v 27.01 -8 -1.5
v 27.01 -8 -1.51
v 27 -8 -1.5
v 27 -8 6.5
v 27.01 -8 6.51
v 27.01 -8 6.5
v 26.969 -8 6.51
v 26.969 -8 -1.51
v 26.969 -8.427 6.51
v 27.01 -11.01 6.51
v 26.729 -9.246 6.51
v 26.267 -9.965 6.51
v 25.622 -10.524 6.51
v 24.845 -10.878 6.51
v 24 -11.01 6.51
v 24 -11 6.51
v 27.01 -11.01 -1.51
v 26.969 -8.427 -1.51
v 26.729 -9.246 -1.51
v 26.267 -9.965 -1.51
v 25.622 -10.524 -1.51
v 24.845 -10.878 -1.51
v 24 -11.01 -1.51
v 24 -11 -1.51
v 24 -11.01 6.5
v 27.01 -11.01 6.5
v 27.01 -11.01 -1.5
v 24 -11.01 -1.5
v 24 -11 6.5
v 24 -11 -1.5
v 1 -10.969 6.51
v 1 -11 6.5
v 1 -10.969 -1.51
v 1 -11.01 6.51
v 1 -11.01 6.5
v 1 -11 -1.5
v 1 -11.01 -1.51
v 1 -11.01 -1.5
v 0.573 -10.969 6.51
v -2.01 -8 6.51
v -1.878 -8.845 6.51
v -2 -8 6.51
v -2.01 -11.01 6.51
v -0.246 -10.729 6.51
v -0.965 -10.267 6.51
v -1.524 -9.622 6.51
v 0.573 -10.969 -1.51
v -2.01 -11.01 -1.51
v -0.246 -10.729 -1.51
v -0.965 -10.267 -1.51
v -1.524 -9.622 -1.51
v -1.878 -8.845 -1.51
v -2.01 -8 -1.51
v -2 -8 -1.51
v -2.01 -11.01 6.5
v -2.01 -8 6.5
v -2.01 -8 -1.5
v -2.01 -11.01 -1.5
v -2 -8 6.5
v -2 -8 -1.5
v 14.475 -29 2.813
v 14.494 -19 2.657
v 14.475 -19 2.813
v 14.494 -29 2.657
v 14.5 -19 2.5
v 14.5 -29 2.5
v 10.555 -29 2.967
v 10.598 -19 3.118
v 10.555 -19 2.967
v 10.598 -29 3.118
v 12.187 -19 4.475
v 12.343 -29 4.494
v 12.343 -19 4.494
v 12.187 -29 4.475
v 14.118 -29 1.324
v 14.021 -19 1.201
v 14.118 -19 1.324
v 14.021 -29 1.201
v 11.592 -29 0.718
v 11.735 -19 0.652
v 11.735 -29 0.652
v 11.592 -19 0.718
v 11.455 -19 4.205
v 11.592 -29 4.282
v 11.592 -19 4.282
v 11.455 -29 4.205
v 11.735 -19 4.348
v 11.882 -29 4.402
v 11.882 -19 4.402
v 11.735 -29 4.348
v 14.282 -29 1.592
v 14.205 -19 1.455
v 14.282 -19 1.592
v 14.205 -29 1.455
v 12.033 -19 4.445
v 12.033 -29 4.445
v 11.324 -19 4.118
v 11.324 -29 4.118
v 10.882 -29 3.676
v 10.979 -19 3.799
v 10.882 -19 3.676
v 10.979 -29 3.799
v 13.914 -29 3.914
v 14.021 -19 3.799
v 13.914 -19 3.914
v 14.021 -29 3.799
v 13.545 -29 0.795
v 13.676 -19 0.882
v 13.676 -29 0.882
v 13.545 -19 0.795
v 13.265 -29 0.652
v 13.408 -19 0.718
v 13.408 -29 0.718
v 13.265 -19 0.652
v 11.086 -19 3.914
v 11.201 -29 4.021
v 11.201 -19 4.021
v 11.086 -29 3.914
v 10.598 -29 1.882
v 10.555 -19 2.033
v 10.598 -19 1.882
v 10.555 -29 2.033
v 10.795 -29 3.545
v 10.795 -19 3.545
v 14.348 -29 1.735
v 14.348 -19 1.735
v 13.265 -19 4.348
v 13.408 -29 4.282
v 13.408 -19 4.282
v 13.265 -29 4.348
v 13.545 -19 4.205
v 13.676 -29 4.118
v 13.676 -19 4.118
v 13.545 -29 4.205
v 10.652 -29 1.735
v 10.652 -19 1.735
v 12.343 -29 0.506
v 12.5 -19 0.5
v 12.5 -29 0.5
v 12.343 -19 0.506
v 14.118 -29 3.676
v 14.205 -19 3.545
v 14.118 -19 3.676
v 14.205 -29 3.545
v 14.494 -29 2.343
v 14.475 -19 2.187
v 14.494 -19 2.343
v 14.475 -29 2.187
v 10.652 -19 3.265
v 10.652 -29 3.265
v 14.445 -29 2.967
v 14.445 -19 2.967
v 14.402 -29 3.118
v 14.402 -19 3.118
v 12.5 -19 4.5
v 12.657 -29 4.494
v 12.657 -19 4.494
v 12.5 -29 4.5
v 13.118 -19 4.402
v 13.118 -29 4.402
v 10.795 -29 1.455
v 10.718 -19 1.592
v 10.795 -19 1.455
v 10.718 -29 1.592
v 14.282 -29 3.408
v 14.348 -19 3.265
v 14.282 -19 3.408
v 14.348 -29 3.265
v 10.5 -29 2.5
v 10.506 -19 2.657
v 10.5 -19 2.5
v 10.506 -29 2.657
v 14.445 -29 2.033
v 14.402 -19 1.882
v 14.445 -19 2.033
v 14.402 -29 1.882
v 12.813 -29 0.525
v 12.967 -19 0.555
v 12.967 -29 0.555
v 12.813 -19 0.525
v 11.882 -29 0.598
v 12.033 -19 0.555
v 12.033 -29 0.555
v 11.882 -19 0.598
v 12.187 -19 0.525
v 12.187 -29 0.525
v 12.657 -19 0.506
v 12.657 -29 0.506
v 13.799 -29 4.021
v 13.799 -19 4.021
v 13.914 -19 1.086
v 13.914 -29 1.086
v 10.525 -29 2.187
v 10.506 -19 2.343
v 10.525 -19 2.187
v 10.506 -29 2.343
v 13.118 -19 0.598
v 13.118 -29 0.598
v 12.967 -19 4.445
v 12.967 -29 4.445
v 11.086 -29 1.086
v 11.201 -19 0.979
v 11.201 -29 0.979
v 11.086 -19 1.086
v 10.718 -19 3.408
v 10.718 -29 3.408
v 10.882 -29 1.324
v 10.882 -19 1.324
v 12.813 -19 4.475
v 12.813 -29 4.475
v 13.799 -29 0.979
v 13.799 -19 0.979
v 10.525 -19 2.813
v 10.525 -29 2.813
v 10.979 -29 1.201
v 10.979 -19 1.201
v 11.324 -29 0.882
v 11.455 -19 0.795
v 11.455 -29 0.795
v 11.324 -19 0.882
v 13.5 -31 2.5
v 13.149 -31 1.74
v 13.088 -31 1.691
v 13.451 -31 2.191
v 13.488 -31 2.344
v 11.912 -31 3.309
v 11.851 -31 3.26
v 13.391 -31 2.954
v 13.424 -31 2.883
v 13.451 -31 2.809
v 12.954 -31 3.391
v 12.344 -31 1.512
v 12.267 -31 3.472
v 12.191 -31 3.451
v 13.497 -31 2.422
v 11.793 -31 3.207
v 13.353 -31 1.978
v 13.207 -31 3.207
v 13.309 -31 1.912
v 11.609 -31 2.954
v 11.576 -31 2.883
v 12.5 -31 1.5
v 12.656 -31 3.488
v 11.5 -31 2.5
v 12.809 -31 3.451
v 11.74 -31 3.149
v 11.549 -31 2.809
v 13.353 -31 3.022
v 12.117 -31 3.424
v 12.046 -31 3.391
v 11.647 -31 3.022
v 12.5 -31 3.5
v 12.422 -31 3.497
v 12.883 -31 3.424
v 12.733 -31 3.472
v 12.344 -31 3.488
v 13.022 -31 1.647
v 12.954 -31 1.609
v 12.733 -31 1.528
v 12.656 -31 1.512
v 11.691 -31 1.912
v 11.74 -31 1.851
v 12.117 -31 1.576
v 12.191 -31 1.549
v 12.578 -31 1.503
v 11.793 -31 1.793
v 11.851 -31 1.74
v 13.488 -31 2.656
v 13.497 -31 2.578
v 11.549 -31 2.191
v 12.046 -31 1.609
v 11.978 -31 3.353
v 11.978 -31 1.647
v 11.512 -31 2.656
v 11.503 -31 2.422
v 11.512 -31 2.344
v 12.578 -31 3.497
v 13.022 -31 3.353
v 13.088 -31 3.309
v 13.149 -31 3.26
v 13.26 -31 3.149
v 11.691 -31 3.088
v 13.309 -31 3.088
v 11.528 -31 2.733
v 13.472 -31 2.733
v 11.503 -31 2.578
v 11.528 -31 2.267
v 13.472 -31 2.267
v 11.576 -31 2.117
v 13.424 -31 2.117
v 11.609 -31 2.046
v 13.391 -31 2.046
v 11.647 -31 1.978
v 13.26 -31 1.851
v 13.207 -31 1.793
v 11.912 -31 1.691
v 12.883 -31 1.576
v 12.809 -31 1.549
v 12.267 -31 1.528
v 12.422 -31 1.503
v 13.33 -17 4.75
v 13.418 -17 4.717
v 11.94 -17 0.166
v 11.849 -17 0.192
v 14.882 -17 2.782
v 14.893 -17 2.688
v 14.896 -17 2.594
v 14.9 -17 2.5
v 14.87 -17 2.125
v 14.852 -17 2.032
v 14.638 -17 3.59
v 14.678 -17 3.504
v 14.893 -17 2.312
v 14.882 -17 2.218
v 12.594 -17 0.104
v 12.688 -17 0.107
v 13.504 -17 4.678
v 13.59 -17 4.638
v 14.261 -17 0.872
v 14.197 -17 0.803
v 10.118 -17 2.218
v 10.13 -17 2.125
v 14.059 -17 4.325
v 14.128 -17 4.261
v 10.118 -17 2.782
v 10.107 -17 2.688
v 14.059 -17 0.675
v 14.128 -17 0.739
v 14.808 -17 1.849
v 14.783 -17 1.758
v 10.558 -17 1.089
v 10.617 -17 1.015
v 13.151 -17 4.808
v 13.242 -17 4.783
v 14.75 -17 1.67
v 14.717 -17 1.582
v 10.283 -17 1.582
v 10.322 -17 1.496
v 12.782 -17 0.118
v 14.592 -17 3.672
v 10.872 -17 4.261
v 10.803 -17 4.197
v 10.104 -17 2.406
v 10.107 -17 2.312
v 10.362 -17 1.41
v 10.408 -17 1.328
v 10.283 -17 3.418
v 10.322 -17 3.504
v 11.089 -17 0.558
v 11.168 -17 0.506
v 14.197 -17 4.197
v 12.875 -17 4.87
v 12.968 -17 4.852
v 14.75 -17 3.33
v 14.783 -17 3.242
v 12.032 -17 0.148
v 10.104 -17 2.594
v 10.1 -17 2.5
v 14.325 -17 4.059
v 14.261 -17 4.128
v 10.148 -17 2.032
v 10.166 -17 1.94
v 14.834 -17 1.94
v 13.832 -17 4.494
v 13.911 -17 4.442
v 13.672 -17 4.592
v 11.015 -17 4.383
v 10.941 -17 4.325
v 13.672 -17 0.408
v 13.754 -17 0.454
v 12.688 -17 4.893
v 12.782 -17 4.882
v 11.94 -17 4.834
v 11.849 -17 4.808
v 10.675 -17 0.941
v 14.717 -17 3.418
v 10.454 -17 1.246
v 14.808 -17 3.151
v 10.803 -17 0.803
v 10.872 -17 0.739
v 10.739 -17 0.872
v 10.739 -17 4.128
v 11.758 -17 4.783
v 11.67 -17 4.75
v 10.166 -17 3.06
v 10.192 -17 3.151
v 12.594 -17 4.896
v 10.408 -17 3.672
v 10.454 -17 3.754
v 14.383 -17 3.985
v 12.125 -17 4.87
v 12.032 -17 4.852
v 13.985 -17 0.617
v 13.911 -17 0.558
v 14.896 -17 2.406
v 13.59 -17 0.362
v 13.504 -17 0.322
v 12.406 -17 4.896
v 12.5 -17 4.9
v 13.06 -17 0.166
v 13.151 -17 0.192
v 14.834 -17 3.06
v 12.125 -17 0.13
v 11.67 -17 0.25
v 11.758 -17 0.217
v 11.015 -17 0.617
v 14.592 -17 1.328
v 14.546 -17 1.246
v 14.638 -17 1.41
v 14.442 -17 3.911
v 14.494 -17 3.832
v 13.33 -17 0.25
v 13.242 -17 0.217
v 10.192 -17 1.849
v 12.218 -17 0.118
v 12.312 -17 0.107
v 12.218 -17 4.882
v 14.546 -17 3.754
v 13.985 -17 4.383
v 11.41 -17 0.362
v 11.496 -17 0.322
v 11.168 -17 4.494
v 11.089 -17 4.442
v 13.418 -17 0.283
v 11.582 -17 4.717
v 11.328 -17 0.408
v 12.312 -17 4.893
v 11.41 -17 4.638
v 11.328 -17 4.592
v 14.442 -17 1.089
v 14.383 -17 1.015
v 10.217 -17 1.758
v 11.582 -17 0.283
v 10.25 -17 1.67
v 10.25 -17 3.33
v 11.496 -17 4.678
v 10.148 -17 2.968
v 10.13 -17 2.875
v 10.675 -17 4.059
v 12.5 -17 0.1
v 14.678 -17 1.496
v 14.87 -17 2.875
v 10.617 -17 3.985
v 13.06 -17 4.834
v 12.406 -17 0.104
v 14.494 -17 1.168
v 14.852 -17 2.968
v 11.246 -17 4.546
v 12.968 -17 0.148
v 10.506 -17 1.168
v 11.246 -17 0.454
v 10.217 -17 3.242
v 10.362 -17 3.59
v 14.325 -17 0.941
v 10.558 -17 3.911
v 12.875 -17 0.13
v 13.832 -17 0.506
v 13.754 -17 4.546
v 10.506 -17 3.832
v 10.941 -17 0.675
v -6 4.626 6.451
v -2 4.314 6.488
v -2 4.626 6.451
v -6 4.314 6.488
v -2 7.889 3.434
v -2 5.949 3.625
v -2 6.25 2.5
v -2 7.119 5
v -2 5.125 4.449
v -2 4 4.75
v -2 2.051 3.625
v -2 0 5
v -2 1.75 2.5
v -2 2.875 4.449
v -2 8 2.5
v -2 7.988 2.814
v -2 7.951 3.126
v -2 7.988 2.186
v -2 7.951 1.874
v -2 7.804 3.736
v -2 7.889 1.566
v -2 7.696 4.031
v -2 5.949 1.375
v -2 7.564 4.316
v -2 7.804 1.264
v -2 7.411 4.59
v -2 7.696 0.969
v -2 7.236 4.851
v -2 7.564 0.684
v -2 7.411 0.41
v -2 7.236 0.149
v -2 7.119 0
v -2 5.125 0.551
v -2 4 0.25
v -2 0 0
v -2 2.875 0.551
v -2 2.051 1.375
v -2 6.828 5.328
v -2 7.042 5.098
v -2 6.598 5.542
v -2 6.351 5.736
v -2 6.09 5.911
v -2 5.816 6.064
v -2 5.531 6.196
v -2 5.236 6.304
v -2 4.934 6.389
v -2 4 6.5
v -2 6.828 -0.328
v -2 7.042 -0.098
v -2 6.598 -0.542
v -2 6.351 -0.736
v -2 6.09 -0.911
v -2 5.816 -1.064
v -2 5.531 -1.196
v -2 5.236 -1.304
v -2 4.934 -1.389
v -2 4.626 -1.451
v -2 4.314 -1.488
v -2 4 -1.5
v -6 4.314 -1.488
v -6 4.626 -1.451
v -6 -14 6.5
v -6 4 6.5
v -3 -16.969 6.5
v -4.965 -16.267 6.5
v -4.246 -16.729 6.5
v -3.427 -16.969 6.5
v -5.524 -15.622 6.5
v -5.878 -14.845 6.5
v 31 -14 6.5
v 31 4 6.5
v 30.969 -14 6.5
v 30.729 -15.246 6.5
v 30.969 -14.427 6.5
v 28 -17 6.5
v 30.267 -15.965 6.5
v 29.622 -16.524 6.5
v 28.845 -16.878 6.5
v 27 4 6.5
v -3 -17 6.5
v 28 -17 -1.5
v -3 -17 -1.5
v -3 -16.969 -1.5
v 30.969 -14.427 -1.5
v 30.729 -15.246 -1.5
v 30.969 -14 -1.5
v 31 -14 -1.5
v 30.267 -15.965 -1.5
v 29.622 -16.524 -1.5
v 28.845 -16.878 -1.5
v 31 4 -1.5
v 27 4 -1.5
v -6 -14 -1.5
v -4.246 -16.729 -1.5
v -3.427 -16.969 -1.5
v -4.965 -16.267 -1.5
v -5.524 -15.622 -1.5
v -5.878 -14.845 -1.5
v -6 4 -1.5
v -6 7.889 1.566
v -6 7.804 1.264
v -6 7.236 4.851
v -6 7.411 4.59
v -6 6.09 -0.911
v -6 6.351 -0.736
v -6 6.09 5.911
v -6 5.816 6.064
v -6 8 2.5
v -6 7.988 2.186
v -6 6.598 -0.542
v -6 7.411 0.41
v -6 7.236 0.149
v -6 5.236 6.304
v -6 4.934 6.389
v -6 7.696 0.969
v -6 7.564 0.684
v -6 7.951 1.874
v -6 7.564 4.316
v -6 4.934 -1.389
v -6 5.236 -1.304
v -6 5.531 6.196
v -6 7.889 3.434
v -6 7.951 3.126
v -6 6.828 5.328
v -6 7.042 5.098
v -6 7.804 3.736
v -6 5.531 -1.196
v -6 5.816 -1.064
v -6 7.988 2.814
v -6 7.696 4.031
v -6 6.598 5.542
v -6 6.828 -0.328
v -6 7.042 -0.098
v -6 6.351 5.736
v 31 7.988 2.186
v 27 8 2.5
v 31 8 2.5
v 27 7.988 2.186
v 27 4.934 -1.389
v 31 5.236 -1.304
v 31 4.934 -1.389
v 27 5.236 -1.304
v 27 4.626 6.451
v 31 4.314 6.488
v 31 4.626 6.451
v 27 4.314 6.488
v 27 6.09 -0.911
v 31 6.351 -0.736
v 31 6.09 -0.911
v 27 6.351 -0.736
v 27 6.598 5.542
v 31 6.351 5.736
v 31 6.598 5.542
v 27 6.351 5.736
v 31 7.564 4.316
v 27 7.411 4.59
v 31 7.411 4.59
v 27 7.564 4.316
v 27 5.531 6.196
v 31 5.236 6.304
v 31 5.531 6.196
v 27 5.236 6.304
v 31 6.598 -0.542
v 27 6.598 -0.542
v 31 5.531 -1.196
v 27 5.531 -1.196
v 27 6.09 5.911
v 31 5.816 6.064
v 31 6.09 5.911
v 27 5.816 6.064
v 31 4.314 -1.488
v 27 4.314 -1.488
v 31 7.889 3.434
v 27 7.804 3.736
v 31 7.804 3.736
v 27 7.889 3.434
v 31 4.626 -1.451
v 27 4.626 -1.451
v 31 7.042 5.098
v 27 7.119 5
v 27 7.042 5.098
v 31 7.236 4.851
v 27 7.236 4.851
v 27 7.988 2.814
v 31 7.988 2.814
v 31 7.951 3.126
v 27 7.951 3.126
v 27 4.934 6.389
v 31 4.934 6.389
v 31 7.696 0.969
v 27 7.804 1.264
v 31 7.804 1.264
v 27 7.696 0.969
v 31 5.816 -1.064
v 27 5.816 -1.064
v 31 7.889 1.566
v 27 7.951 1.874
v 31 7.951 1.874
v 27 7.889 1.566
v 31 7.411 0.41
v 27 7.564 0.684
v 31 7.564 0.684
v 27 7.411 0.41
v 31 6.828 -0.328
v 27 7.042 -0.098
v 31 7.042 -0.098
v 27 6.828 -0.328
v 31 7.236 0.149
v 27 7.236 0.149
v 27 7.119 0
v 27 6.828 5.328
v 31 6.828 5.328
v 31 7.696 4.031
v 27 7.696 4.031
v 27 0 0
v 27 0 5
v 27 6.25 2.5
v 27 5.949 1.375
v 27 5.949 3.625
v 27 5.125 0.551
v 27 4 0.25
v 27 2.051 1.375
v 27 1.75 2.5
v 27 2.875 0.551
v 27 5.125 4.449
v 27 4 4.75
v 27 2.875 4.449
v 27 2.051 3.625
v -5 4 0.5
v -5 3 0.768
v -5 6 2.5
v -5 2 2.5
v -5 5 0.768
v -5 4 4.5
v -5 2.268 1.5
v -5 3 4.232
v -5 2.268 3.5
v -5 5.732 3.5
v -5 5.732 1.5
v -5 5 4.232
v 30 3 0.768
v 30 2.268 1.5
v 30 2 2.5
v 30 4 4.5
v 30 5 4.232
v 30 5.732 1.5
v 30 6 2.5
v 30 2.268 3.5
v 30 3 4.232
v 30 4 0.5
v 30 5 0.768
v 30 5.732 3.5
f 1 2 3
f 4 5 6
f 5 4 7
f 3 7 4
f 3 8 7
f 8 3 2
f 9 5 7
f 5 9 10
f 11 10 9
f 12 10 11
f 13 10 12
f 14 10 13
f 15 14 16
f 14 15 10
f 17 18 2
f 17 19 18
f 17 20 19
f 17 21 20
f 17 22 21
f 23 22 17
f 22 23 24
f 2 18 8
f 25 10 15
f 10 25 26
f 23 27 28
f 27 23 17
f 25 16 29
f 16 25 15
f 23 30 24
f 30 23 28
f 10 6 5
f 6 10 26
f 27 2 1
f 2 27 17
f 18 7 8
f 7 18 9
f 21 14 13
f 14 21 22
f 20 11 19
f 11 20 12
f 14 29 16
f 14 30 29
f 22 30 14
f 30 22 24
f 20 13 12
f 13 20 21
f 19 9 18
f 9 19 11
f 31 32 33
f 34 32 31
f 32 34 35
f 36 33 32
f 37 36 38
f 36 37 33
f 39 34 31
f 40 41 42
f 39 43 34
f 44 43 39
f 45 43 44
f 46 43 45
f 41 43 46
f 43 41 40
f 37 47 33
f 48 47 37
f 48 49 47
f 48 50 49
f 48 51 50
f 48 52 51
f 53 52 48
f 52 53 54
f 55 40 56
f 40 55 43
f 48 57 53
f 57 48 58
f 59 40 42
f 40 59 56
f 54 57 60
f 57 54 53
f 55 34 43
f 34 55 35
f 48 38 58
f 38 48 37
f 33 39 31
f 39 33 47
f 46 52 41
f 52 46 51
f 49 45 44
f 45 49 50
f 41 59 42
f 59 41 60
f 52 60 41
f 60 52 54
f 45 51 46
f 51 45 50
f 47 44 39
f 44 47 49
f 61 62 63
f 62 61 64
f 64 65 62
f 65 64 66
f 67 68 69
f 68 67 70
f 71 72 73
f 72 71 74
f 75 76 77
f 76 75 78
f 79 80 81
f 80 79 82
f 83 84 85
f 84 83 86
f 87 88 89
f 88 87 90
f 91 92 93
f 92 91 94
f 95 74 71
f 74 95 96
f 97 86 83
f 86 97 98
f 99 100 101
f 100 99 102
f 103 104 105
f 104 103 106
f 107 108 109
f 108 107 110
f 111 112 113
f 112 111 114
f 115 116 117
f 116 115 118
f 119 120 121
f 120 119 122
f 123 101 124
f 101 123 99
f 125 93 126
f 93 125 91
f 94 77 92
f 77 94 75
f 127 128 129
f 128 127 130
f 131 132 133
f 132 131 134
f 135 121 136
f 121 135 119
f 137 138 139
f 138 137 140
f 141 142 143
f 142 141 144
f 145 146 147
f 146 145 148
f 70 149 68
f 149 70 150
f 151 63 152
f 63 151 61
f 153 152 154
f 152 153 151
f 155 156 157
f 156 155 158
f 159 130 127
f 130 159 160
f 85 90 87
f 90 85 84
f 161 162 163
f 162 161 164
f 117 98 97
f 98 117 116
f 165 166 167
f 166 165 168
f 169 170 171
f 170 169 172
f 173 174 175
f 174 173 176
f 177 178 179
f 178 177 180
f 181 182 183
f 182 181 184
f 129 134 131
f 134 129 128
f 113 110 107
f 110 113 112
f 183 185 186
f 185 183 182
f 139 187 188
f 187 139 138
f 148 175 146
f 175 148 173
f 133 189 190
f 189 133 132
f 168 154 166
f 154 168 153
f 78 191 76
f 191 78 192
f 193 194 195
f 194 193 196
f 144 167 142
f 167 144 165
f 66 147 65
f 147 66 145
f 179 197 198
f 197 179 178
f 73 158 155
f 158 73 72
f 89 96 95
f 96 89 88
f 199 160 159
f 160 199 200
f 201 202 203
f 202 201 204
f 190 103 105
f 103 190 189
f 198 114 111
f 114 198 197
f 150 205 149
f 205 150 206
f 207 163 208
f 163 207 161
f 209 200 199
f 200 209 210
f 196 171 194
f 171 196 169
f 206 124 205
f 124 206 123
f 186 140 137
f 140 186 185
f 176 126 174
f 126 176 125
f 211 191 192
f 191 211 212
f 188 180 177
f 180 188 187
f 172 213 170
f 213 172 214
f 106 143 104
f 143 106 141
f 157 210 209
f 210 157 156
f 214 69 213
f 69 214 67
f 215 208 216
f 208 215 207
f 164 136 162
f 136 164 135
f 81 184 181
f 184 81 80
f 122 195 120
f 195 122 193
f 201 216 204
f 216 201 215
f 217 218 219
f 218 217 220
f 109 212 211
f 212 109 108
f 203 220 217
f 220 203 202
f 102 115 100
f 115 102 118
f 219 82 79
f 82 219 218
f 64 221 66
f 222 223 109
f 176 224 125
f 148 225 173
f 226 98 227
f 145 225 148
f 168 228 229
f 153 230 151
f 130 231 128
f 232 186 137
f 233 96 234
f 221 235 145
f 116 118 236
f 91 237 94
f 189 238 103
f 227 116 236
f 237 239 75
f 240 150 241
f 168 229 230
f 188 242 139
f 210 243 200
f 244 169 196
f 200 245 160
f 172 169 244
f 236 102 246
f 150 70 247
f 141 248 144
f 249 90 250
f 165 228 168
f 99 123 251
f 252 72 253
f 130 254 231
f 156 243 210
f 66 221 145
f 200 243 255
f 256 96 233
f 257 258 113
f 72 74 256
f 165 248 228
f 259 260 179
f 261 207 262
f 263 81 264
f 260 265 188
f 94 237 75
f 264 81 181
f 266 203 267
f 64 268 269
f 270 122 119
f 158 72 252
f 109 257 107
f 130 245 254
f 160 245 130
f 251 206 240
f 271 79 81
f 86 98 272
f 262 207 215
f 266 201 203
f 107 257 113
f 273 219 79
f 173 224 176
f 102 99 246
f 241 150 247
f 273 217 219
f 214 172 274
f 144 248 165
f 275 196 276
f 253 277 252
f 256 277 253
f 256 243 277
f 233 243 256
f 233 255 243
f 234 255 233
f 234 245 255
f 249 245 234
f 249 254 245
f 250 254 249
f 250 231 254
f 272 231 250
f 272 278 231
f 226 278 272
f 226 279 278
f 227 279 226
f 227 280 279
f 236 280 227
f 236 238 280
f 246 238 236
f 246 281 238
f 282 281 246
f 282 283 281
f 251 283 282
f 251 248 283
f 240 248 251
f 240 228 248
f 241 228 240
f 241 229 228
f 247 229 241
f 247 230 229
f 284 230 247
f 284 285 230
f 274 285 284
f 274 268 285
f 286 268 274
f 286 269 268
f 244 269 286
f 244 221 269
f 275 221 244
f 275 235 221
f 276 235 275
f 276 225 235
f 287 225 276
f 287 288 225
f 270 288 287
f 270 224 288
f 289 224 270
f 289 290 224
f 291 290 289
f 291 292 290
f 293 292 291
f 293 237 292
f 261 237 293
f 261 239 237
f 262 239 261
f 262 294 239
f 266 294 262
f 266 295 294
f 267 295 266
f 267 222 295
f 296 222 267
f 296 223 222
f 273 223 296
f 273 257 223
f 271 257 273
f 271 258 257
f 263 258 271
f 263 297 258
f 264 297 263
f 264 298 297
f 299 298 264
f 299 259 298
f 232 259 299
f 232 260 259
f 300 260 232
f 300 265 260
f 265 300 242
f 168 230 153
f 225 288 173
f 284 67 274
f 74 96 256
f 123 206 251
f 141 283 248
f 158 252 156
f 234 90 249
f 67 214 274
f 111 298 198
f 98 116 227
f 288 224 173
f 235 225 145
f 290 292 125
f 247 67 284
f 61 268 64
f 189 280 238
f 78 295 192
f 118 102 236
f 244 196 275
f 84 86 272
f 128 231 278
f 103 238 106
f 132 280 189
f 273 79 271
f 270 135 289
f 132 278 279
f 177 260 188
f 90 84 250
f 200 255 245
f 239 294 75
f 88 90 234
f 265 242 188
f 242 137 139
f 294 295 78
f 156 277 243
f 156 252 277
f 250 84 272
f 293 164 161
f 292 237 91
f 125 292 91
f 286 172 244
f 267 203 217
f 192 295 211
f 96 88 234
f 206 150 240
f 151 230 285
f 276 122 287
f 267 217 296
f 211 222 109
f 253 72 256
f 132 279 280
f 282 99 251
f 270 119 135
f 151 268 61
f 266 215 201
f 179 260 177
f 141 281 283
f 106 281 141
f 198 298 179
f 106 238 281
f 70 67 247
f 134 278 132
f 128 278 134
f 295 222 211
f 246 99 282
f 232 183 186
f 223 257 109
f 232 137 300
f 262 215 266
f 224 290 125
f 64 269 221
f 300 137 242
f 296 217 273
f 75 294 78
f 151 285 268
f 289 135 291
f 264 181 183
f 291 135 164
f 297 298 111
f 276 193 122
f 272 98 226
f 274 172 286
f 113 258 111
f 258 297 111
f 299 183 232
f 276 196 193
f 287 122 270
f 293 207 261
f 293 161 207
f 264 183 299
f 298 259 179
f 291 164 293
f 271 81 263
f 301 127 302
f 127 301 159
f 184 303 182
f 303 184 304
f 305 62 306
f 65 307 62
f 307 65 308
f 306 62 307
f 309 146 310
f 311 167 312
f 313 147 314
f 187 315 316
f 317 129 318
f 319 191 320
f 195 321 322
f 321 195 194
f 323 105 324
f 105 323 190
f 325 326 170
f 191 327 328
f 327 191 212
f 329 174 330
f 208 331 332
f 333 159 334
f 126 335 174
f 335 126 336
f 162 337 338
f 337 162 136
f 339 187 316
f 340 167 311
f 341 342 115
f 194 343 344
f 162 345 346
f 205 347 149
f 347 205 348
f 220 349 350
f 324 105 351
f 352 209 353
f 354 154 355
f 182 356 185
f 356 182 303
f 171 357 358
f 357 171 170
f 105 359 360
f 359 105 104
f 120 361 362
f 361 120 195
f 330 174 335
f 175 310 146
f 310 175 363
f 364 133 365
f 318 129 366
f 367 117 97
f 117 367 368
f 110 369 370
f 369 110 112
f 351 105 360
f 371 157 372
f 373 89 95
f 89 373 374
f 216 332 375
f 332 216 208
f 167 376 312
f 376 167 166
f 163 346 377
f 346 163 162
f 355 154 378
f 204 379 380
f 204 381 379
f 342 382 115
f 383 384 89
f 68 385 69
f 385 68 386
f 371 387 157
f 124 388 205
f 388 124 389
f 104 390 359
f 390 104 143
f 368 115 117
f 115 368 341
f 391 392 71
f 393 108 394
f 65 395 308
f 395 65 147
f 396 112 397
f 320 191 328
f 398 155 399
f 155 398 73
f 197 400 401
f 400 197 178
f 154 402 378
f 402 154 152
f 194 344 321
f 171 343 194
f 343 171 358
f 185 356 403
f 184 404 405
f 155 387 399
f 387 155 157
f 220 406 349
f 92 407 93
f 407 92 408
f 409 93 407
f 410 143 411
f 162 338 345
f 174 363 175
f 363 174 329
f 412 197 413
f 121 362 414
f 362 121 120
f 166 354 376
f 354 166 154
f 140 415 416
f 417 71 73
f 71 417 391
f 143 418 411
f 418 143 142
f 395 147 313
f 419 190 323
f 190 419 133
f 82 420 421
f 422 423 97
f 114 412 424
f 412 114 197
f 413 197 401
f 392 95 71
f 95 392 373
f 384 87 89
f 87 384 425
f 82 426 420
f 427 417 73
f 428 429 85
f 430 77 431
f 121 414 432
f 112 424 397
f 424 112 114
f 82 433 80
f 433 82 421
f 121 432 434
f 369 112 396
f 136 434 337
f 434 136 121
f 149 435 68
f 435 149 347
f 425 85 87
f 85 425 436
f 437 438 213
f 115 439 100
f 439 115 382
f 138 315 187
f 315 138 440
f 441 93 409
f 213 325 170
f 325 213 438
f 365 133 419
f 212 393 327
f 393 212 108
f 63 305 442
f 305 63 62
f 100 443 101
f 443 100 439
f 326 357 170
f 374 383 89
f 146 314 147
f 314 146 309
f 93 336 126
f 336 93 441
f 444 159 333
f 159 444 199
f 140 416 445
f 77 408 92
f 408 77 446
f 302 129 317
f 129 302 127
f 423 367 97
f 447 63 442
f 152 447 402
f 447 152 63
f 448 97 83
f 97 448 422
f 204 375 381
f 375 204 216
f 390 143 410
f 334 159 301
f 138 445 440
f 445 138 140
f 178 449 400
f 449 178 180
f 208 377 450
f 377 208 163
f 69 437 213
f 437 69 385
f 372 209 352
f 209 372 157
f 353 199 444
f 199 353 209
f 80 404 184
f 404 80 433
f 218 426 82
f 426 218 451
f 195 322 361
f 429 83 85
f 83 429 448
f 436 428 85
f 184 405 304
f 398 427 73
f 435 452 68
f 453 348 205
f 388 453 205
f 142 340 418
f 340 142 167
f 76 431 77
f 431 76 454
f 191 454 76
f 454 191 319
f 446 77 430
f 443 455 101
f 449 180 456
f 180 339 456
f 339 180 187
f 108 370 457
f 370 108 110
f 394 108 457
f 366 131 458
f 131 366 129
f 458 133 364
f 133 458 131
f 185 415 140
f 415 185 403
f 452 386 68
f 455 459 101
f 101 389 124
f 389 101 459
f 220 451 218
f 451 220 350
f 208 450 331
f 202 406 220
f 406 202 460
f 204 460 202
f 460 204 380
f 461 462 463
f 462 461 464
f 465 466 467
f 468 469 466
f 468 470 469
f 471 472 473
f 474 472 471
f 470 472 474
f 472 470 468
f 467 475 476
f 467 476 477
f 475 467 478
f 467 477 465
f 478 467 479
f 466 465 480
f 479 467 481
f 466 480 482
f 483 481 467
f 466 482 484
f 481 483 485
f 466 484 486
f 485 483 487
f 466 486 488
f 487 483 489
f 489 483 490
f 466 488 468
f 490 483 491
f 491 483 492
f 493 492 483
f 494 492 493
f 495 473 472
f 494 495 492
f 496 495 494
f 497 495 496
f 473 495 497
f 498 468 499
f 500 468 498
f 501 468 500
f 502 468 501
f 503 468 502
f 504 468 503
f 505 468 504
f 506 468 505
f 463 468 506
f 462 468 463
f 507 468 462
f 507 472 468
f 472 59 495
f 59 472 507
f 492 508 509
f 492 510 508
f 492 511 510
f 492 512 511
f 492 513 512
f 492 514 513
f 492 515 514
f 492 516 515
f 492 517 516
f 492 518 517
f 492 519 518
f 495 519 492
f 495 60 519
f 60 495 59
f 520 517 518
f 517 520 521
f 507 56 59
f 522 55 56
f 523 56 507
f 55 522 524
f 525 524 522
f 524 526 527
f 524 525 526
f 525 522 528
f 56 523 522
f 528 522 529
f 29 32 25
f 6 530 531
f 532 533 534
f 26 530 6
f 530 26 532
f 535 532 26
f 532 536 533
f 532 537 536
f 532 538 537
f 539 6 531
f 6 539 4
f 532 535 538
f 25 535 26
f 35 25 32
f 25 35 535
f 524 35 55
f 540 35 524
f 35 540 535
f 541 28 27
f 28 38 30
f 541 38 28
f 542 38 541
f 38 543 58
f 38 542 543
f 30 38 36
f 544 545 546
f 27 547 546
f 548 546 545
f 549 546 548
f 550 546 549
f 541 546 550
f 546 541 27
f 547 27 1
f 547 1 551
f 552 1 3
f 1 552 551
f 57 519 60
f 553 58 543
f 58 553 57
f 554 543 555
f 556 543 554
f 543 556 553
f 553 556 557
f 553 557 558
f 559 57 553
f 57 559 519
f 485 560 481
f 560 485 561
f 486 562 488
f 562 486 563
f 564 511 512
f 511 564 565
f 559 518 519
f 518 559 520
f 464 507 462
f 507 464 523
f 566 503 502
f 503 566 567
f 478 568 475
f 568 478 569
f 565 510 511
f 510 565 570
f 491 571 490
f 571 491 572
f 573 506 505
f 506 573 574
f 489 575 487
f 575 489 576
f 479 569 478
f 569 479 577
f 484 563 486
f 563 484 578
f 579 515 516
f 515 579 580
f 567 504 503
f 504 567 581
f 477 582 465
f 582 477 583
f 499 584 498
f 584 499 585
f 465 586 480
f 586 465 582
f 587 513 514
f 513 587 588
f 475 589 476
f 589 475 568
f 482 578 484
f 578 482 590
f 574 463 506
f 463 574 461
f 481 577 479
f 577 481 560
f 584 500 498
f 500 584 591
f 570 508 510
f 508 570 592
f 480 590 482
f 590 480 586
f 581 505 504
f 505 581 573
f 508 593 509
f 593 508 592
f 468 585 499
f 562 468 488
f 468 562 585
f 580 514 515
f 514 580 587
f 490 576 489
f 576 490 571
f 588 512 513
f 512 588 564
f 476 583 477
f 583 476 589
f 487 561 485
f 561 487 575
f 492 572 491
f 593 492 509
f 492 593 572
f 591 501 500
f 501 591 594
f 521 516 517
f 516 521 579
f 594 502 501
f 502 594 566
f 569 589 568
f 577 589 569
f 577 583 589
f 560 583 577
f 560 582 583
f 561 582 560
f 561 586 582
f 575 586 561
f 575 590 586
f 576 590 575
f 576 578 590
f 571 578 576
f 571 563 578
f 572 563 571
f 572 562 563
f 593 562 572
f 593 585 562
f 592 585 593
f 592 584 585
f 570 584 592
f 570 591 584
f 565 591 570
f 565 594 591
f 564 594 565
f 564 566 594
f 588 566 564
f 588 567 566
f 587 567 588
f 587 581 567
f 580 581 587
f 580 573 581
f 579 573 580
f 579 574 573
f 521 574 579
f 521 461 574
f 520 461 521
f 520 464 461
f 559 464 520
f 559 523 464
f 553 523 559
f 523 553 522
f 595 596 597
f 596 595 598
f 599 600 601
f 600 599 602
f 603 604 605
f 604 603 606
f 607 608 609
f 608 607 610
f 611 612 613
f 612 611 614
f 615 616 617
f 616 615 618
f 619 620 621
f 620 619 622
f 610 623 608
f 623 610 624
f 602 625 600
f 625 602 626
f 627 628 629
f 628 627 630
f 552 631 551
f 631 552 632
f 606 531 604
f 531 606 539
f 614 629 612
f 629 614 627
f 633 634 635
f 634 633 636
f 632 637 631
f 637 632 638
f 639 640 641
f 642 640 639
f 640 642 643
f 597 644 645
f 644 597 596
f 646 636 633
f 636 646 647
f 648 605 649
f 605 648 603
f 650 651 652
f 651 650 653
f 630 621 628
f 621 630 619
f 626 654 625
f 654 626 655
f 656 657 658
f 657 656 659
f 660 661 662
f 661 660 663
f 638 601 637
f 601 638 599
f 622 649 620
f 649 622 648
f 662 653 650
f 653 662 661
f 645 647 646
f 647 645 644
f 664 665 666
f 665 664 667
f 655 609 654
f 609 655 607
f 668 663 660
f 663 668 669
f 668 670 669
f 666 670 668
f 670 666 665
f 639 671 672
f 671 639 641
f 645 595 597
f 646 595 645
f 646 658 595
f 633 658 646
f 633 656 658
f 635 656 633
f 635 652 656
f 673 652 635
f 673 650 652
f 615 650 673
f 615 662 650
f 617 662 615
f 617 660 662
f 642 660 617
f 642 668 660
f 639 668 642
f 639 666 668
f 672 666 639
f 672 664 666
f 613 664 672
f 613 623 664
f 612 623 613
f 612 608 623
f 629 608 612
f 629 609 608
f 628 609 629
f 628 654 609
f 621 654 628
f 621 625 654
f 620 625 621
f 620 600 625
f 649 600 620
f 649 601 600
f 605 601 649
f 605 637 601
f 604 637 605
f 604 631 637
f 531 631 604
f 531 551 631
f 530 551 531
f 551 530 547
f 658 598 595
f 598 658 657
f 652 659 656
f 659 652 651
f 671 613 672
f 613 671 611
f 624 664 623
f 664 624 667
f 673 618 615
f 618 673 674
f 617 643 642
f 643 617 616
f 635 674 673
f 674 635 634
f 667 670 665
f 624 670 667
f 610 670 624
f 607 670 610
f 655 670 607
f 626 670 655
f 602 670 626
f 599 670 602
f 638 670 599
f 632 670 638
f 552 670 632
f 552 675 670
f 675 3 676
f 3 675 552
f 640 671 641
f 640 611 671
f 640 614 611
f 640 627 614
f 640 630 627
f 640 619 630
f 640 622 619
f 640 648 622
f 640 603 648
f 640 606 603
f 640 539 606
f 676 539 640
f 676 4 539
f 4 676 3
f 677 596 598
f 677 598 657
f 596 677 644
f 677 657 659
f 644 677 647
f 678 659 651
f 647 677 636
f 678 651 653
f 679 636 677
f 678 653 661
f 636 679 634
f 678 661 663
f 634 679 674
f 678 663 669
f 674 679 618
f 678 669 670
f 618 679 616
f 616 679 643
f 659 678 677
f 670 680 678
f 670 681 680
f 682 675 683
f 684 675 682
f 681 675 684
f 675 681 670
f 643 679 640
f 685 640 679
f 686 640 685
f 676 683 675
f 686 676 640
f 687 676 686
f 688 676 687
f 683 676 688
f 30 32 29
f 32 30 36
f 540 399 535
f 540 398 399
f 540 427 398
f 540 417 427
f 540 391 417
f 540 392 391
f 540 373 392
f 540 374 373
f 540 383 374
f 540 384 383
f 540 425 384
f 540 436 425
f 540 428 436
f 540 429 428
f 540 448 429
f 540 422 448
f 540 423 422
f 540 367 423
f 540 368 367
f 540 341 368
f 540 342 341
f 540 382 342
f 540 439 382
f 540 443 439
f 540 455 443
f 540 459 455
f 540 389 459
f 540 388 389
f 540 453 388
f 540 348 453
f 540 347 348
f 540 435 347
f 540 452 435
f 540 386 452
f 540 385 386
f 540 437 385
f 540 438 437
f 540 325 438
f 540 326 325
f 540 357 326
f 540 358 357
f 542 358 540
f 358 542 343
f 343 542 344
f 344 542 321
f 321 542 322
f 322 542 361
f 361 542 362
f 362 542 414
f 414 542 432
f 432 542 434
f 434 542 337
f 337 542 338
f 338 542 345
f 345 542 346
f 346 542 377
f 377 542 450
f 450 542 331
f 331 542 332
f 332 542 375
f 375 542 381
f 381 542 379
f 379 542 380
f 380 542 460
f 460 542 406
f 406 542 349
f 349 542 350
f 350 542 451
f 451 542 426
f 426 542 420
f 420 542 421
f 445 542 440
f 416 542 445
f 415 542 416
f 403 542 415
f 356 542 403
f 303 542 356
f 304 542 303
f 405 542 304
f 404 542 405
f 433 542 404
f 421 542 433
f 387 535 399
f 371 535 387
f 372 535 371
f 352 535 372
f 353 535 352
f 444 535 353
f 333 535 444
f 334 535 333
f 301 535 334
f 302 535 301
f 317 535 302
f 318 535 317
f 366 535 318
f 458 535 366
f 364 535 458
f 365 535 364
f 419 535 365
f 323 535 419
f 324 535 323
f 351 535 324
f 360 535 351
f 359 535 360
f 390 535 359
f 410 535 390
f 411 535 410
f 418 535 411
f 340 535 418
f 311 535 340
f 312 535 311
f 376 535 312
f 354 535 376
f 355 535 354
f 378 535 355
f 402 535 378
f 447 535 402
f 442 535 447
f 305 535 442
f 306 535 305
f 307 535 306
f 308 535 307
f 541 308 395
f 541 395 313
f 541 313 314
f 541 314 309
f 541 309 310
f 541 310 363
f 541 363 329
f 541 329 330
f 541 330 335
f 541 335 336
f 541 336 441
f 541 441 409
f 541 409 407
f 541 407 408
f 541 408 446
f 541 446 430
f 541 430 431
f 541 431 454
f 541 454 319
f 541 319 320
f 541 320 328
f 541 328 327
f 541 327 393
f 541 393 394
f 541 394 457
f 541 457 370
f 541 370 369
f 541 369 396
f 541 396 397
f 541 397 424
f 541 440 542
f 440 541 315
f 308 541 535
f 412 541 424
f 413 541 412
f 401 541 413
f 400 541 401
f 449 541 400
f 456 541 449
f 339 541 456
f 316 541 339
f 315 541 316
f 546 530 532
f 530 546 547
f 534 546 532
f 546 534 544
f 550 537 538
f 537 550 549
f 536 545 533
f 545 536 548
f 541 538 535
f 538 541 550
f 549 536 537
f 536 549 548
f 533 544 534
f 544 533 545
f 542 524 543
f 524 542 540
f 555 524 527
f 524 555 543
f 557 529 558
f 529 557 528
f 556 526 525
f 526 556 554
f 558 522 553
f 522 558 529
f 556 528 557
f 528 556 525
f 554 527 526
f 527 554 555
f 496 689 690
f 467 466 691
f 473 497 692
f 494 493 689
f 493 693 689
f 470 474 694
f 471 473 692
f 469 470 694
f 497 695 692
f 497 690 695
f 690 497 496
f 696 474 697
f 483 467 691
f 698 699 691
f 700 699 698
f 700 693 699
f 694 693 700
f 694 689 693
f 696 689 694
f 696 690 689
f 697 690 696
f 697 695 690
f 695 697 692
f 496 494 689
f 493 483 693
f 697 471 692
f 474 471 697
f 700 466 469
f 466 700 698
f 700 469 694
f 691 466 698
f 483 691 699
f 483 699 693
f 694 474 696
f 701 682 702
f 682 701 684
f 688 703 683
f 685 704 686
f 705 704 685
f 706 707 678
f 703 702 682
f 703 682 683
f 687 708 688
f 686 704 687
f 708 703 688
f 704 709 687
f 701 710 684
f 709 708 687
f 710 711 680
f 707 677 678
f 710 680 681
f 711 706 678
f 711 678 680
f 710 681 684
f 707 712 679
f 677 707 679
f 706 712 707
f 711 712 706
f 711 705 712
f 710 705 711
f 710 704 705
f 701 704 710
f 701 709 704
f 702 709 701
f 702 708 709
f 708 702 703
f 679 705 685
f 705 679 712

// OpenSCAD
// file: hexcut.scad
// hexcut

//--------------------------------
module hexcut1(
R=1,
x0=0,
y0=0,
h0=10,
N0=4
){
        
    for (i=[0:N0-1]){
        translate([x0,y0+i*R*2,-1])
        cylinder(r=R,h=h0,$fn=6);
    }
    for (i=[0:N0-2]){
        translate([x0-1.717*R,y0+R+i*R*2,-1])
        cylinder(r=R,h=h0,$fn=6);
    }
    for (i=[0:N0-2]){
        translate([x0+1.717*R,y0+R+i*R*2,-1])
        cylinder(r=R,h=h0,$fn=6);
    }

}


//=======================
    
hexcut1();
    
    
// file: rounder.scad
// rounder.scad
// cutting tool for rounding off corners with a cylinder

//---------------------
module rounder(
r=10,   // radius
h=10,   // height
f=22,    // $fn
extra=0.01  // extra size for the cube
){

difference(){
  translate([-extra,-extra,-extra])
  cube([r+extra,r+extra,h+2*extra]);
  translate([r,r,-1])
  cylinder(r=r,h=h+2,$fn=f);
}

}

//---------------------------------------------------------------------------
module bevel(x=1,y=1,h=10){

linear_extrude(height=h)
polygon(points=[[0,0],[x,0],[0,y]]);
    
}
  

//========================

rounder();

//========================
// file: camlid1.scad
// camlid1.scad
// This is the front plate
use <cambase1.scad>

module camlid1(){
    
difference(){
union(){
    // main boss
    translate([0,0,-1])
    color("yellow")
    linear_extrude(height=7)
    offset(r=3,$fn=80)    
    square(size=[25,24]);

    // camera bump boss
    translate([12.5,12,6])
    color("green")
    linear_extrude(height=5,scale=0.70)
    offset(r=3,$fn=80)
    square([25,24],center=true);

}
    // main boss cutout
    translate([0,0,-2])
    color("orange")
    linear_extrude(height=7)
    offset(r=2,$fn=16)    
    square(size=[25,24]);

    // side cuts for articulation
    translate([26.9,-7.5,1])
    color("pink")
    rotate([-45,0,0])
    cube([6.1,22,18]);

    translate([-8,-7.5,1])
    color("green")
    rotate([-45,0,0])
    cube([6.1,22,18]);

    // bottom cut for cable
    translate([-5,-6,-2])
    color("green")
    cube([35,6,7]);

    // hollow out the camera bump
    translate([12.5,12,4.5])
    color("green")
    linear_extrude(height=5.5,scale=0.70)
    offset(r=3,$fn=16)
    square([15,19],center=true);

    // hole for the lens
    translate([12.5,9.75,9])
    color("cyan")
    cylinder(r1=3.5,r2=6.0,h=2.1,$fn=80);
}

// support for ribbon cable
translate([4.25,-2.5,4.5])
rotate([0,90,0])
scale([1,2]){
  difference(){
    union(){
        sphere(r=1.5,$fa=5, $fs=0.1);
        translate([0,0,16.5])
        sphere(r=1.5,$fa=5, $fs=0.1);
        cylinder(r=1.5,h=16.5,$fn=80);
    }
        translate([-5,0,-5])    
        cube([10,10,50]);
    }
}

    // tab near cable
    translate([-1,-3,3])
    color("pink")
    cube([27,1,2]);

    // tab topside
    translate([0,25.5,-1])
    color("cyan")
    cube([25,0.5,1]);

    // tab left
    translate([-2.0,20,-1])
    color("cyan")
    cube([0.5,4,1]);

    // tab right
    translate([26.5,20,-1])
    color("cyan")
    cube([0.5,4,1]);

}  // end of module 

camlid1();

//cambase1();
// file: cambase1.scad
// cambase1.scad
// This is the back for the camera

use <hexcut.scad>


module cambase1(){
    
// main shell
difference(){
    color("yellow")
    linear_extrude(height=5)
    offset(r=2,$fn=80)    
    square(size=[25,24]);

    translate([0,0,1])
    color("orange")
    linear_extrude(height=5)
    offset(r=0.3,$fn=16)    
    square(size=[25,24]);

    translate([4,-3,1])
    color("green")
    cube([17,5,5]);

}
translate([3,-2.5,1.0])
rotate([0,90,0])
scale([1,2]){
    sphere(r=1.0,$fa=5, $fs=0.1);
    translate([0,0,19])
    sphere(r=1.0,$fa=5, $fs=0.1);
    cylinder(r=1.0,h=19,$fn=80);
}
// posts to support PCB
translate([2.0,9.5,1]){
    cylinder(r=2,h=3,$fn=16);
    cylinder(r=0.8,h=4,$fn=16);
}
translate([2.0,22,1]){
    cylinder(r=2,h=3,$fn=16);
    cylinder(r=0.8,h=4,$fn=16);
}
translate([23.0,9.5,1]){
    cylinder(r=2,h=3,$fn=16);
    cylinder(r=0.8,h=4,$fn=16);
}
translate([23.0,22,1]){
    cylinder(r=2,h=3,$fn=16);
    cylinder(r=0.8,h=4,$fn=16);
}

// pivots on sides to mount
translate([-5,4,2.5])
color("pink")
rotate([0,90,0])
cylinder(r1=2,r2=2.25,h=3,$fn=12);

translate([30,4,2.5])
color("pink")
rotate([0,-90,0])
cylinder(r1=2,r2=2.25,h=3,$fn=12);


} // end module cambase1

//-------------------------
// No pins on the sides
module cambase2(){
    
// main shell
difference(){
    color("yellow")
    linear_extrude(height=5)
    offset(r=2,$fn=80)    
    square(size=[25,24]);

    translate([0,0,1])
    color("orange")
    linear_extrude(height=5)
    offset(r=0.2,$fn=16)    
    square(size=[25,24]);

    translate([4,-3,1])
    color("green")
    cube([17,5,5]);

}
translate([3-3,-2.5,1.0])
rotate([0,90,0])
scale([1,2]){
    sphere(r=1.0,$fa=5, $fs=0.1);
    translate([0,0,19+6])
    sphere(r=1.0,$fa=5, $fs=0.1);
    cylinder(r=1.0,h=19+6,$fn=80);
}
// posts to support PCB
translate([2.0,9.5,1]){
    cylinder(r=2,h=3,$fn=16);
    cylinder(r=0.8,h=4,$fn=16);
}
translate([2.0,22,1]){
    cylinder(r=2,h=3,$fn=16);
    cylinder(r=0.8,h=4,$fn=16);
}
translate([23.0,9.5,1]){
    cylinder(r=2,h=3,$fn=16);
    cylinder(r=0.8,h=4,$fn=16);
}
translate([23.0,22,1]){
    cylinder(r=2,h=3,$fn=16);
    cylinder(r=0.8,h=4,$fn=16);
}


} // end module cambase1
//----------------------------------
// decorate cambase2
module cambase3(){
    
    difference(){
        cambase2();    
        hexcut1(x0=12.5,y0=3,R=3);
    }
}

//=================================

//translate([80,0,0])
//cambase1();

//translate([40,0,0])
//cambase2();

cambase3();

//cambase1();

//translate([0,0,30])
//cambase2();
// main file
//======================================================================
// cambracket1.scad
// This is the forks
use <cambase1.scad>
use <camlid1.scad>
use <rounder.scad>

//======================================================================

module old_cambracket1(){
  difference(){
  union(){
  // left side of bracket
  hull(){
      color("red")
      translate([-6,4,2.5])
      rotate([0,90,0])
      cylinder(r1=3,r2=3.5,h=4,$fn=80);

      color("pink")
      translate([-4,-12,2.5])
      sphere(2,$fa=5, $fs=0.1);
  }

  hull(){
      color("pink")
      translate([-4,-12,2.5])
      sphere(2,$fa=5, $fs=0.1);

      color("blue")
      translate([12.5,-14,2.5])
      sphere(3,$fa=5, $fs=0.1);
  }

  // mirror as right side
  translate([25,0,0])
  mirror([1,0,0]){
  hull(){
      color("red")
      translate([-6,4,2.5])
      rotate([0,90,0])
      cylinder(r1=3,r2=3.5,h=4,$fn=80);

      color("pink")
      translate([-4,-12,2.5])
      sphere(2,$fa=5, $fs=0.1);
  }

  hull(){
      color("pink")
      translate([-4,-12,2.5])
      sphere(2,$fa=5, $fs=0.1);

      color("blue")
      translate([12.5,-14,2.5])
      sphere(3,$fa=5, $fs=0.1);
  }
  }
      // the vertical pole
      translate([12.5,-14,2.5]){
          rotate([0,0,0]){
          color("red")
          rotate([90,0,0])
          cylinder(r=2,h=15,$fn=80);

          translate([0,-15,0])
          rotate([90,0,0])
          color("green")
          cylinder(r1=2,r2=1,h=2,$fn=80);

          color("cyan")
          rotate([90,0,0])
          cylinder(r1=3.0,r2=2,h=5,$fn=80);
          }
      }
  }

  cambase1();
  } // end of difference
}

module cambracket1(){
  difference(){
  union(){
  // left side of bracket
  hull(){
      color("red")
      translate([-6,4,2.5])
      rotate([0,90,0])
      cylinder(r=4,h=4,$fn=80);

      color("pink")
      translate([-4,-12,2.5])
      //sphere(2,$fa=5, $fs=0.1);
      cube([4,8,8],center=true);
  }

  // mirror as right side
  translate([25,0,0])
  mirror([1,0,0]){
    hull(){
        color("red")
        translate([-6,4,2.5])
        rotate([0,90,0])
        cylinder(r=4,h=4,$fn=80);

        color("pink")
        translate([-4,-12,2.5])
        //sphere(2,$fa=5, $fs=0.1);
        cube([4,8,8],center=true);
    }
  }
  
    // crossbar
    translate([12.5,-14,2.5])
    cube([37,6,8],center=true);

    rr=3;
    translate([12.5+14.5,-11,-1.5])
    rotate([0,0,90])
    rounder(r=rr,h=8,f=22);  
    translate([12.5-14.5,-11,-1.5])
    rotate([0,0,0])
    rounder(r=rr,h=8,f=22);  
    
    // the vertical pole
    translate([12.5,-14,2.5]){
        rotate([0,0,0]){
        color("red")
        rotate([90,0,0])
        cylinder(r=2,h=15,$fn=80);

        translate([0,-15,0])
        rotate([90,0,0])
        color("green")
        cylinder(r1=2,r2=1,h=2,$fn=80);

        color("cyan")
        rotate([90,0,0])
        cylinder(r1=3.0,r2=2,h=5,$fn=80);
        }
    }
  }
  
  rr=3;
  translate([12.5+14.5+4,-12-5,-1.5])
  rotate([0,0,90])
  rounder(r=rr,h=8,f=22);  
  translate([12.5-14.5-4,-12-5,-1.5])
  rotate([0,0,0])
  rounder(r=rr,h=8,f=22);  
    
  cambase1();
  } // end of difference
}

//======================================================================

cambracket1();

//~ cambase1();

//~ camlid1();

//======================================================================
